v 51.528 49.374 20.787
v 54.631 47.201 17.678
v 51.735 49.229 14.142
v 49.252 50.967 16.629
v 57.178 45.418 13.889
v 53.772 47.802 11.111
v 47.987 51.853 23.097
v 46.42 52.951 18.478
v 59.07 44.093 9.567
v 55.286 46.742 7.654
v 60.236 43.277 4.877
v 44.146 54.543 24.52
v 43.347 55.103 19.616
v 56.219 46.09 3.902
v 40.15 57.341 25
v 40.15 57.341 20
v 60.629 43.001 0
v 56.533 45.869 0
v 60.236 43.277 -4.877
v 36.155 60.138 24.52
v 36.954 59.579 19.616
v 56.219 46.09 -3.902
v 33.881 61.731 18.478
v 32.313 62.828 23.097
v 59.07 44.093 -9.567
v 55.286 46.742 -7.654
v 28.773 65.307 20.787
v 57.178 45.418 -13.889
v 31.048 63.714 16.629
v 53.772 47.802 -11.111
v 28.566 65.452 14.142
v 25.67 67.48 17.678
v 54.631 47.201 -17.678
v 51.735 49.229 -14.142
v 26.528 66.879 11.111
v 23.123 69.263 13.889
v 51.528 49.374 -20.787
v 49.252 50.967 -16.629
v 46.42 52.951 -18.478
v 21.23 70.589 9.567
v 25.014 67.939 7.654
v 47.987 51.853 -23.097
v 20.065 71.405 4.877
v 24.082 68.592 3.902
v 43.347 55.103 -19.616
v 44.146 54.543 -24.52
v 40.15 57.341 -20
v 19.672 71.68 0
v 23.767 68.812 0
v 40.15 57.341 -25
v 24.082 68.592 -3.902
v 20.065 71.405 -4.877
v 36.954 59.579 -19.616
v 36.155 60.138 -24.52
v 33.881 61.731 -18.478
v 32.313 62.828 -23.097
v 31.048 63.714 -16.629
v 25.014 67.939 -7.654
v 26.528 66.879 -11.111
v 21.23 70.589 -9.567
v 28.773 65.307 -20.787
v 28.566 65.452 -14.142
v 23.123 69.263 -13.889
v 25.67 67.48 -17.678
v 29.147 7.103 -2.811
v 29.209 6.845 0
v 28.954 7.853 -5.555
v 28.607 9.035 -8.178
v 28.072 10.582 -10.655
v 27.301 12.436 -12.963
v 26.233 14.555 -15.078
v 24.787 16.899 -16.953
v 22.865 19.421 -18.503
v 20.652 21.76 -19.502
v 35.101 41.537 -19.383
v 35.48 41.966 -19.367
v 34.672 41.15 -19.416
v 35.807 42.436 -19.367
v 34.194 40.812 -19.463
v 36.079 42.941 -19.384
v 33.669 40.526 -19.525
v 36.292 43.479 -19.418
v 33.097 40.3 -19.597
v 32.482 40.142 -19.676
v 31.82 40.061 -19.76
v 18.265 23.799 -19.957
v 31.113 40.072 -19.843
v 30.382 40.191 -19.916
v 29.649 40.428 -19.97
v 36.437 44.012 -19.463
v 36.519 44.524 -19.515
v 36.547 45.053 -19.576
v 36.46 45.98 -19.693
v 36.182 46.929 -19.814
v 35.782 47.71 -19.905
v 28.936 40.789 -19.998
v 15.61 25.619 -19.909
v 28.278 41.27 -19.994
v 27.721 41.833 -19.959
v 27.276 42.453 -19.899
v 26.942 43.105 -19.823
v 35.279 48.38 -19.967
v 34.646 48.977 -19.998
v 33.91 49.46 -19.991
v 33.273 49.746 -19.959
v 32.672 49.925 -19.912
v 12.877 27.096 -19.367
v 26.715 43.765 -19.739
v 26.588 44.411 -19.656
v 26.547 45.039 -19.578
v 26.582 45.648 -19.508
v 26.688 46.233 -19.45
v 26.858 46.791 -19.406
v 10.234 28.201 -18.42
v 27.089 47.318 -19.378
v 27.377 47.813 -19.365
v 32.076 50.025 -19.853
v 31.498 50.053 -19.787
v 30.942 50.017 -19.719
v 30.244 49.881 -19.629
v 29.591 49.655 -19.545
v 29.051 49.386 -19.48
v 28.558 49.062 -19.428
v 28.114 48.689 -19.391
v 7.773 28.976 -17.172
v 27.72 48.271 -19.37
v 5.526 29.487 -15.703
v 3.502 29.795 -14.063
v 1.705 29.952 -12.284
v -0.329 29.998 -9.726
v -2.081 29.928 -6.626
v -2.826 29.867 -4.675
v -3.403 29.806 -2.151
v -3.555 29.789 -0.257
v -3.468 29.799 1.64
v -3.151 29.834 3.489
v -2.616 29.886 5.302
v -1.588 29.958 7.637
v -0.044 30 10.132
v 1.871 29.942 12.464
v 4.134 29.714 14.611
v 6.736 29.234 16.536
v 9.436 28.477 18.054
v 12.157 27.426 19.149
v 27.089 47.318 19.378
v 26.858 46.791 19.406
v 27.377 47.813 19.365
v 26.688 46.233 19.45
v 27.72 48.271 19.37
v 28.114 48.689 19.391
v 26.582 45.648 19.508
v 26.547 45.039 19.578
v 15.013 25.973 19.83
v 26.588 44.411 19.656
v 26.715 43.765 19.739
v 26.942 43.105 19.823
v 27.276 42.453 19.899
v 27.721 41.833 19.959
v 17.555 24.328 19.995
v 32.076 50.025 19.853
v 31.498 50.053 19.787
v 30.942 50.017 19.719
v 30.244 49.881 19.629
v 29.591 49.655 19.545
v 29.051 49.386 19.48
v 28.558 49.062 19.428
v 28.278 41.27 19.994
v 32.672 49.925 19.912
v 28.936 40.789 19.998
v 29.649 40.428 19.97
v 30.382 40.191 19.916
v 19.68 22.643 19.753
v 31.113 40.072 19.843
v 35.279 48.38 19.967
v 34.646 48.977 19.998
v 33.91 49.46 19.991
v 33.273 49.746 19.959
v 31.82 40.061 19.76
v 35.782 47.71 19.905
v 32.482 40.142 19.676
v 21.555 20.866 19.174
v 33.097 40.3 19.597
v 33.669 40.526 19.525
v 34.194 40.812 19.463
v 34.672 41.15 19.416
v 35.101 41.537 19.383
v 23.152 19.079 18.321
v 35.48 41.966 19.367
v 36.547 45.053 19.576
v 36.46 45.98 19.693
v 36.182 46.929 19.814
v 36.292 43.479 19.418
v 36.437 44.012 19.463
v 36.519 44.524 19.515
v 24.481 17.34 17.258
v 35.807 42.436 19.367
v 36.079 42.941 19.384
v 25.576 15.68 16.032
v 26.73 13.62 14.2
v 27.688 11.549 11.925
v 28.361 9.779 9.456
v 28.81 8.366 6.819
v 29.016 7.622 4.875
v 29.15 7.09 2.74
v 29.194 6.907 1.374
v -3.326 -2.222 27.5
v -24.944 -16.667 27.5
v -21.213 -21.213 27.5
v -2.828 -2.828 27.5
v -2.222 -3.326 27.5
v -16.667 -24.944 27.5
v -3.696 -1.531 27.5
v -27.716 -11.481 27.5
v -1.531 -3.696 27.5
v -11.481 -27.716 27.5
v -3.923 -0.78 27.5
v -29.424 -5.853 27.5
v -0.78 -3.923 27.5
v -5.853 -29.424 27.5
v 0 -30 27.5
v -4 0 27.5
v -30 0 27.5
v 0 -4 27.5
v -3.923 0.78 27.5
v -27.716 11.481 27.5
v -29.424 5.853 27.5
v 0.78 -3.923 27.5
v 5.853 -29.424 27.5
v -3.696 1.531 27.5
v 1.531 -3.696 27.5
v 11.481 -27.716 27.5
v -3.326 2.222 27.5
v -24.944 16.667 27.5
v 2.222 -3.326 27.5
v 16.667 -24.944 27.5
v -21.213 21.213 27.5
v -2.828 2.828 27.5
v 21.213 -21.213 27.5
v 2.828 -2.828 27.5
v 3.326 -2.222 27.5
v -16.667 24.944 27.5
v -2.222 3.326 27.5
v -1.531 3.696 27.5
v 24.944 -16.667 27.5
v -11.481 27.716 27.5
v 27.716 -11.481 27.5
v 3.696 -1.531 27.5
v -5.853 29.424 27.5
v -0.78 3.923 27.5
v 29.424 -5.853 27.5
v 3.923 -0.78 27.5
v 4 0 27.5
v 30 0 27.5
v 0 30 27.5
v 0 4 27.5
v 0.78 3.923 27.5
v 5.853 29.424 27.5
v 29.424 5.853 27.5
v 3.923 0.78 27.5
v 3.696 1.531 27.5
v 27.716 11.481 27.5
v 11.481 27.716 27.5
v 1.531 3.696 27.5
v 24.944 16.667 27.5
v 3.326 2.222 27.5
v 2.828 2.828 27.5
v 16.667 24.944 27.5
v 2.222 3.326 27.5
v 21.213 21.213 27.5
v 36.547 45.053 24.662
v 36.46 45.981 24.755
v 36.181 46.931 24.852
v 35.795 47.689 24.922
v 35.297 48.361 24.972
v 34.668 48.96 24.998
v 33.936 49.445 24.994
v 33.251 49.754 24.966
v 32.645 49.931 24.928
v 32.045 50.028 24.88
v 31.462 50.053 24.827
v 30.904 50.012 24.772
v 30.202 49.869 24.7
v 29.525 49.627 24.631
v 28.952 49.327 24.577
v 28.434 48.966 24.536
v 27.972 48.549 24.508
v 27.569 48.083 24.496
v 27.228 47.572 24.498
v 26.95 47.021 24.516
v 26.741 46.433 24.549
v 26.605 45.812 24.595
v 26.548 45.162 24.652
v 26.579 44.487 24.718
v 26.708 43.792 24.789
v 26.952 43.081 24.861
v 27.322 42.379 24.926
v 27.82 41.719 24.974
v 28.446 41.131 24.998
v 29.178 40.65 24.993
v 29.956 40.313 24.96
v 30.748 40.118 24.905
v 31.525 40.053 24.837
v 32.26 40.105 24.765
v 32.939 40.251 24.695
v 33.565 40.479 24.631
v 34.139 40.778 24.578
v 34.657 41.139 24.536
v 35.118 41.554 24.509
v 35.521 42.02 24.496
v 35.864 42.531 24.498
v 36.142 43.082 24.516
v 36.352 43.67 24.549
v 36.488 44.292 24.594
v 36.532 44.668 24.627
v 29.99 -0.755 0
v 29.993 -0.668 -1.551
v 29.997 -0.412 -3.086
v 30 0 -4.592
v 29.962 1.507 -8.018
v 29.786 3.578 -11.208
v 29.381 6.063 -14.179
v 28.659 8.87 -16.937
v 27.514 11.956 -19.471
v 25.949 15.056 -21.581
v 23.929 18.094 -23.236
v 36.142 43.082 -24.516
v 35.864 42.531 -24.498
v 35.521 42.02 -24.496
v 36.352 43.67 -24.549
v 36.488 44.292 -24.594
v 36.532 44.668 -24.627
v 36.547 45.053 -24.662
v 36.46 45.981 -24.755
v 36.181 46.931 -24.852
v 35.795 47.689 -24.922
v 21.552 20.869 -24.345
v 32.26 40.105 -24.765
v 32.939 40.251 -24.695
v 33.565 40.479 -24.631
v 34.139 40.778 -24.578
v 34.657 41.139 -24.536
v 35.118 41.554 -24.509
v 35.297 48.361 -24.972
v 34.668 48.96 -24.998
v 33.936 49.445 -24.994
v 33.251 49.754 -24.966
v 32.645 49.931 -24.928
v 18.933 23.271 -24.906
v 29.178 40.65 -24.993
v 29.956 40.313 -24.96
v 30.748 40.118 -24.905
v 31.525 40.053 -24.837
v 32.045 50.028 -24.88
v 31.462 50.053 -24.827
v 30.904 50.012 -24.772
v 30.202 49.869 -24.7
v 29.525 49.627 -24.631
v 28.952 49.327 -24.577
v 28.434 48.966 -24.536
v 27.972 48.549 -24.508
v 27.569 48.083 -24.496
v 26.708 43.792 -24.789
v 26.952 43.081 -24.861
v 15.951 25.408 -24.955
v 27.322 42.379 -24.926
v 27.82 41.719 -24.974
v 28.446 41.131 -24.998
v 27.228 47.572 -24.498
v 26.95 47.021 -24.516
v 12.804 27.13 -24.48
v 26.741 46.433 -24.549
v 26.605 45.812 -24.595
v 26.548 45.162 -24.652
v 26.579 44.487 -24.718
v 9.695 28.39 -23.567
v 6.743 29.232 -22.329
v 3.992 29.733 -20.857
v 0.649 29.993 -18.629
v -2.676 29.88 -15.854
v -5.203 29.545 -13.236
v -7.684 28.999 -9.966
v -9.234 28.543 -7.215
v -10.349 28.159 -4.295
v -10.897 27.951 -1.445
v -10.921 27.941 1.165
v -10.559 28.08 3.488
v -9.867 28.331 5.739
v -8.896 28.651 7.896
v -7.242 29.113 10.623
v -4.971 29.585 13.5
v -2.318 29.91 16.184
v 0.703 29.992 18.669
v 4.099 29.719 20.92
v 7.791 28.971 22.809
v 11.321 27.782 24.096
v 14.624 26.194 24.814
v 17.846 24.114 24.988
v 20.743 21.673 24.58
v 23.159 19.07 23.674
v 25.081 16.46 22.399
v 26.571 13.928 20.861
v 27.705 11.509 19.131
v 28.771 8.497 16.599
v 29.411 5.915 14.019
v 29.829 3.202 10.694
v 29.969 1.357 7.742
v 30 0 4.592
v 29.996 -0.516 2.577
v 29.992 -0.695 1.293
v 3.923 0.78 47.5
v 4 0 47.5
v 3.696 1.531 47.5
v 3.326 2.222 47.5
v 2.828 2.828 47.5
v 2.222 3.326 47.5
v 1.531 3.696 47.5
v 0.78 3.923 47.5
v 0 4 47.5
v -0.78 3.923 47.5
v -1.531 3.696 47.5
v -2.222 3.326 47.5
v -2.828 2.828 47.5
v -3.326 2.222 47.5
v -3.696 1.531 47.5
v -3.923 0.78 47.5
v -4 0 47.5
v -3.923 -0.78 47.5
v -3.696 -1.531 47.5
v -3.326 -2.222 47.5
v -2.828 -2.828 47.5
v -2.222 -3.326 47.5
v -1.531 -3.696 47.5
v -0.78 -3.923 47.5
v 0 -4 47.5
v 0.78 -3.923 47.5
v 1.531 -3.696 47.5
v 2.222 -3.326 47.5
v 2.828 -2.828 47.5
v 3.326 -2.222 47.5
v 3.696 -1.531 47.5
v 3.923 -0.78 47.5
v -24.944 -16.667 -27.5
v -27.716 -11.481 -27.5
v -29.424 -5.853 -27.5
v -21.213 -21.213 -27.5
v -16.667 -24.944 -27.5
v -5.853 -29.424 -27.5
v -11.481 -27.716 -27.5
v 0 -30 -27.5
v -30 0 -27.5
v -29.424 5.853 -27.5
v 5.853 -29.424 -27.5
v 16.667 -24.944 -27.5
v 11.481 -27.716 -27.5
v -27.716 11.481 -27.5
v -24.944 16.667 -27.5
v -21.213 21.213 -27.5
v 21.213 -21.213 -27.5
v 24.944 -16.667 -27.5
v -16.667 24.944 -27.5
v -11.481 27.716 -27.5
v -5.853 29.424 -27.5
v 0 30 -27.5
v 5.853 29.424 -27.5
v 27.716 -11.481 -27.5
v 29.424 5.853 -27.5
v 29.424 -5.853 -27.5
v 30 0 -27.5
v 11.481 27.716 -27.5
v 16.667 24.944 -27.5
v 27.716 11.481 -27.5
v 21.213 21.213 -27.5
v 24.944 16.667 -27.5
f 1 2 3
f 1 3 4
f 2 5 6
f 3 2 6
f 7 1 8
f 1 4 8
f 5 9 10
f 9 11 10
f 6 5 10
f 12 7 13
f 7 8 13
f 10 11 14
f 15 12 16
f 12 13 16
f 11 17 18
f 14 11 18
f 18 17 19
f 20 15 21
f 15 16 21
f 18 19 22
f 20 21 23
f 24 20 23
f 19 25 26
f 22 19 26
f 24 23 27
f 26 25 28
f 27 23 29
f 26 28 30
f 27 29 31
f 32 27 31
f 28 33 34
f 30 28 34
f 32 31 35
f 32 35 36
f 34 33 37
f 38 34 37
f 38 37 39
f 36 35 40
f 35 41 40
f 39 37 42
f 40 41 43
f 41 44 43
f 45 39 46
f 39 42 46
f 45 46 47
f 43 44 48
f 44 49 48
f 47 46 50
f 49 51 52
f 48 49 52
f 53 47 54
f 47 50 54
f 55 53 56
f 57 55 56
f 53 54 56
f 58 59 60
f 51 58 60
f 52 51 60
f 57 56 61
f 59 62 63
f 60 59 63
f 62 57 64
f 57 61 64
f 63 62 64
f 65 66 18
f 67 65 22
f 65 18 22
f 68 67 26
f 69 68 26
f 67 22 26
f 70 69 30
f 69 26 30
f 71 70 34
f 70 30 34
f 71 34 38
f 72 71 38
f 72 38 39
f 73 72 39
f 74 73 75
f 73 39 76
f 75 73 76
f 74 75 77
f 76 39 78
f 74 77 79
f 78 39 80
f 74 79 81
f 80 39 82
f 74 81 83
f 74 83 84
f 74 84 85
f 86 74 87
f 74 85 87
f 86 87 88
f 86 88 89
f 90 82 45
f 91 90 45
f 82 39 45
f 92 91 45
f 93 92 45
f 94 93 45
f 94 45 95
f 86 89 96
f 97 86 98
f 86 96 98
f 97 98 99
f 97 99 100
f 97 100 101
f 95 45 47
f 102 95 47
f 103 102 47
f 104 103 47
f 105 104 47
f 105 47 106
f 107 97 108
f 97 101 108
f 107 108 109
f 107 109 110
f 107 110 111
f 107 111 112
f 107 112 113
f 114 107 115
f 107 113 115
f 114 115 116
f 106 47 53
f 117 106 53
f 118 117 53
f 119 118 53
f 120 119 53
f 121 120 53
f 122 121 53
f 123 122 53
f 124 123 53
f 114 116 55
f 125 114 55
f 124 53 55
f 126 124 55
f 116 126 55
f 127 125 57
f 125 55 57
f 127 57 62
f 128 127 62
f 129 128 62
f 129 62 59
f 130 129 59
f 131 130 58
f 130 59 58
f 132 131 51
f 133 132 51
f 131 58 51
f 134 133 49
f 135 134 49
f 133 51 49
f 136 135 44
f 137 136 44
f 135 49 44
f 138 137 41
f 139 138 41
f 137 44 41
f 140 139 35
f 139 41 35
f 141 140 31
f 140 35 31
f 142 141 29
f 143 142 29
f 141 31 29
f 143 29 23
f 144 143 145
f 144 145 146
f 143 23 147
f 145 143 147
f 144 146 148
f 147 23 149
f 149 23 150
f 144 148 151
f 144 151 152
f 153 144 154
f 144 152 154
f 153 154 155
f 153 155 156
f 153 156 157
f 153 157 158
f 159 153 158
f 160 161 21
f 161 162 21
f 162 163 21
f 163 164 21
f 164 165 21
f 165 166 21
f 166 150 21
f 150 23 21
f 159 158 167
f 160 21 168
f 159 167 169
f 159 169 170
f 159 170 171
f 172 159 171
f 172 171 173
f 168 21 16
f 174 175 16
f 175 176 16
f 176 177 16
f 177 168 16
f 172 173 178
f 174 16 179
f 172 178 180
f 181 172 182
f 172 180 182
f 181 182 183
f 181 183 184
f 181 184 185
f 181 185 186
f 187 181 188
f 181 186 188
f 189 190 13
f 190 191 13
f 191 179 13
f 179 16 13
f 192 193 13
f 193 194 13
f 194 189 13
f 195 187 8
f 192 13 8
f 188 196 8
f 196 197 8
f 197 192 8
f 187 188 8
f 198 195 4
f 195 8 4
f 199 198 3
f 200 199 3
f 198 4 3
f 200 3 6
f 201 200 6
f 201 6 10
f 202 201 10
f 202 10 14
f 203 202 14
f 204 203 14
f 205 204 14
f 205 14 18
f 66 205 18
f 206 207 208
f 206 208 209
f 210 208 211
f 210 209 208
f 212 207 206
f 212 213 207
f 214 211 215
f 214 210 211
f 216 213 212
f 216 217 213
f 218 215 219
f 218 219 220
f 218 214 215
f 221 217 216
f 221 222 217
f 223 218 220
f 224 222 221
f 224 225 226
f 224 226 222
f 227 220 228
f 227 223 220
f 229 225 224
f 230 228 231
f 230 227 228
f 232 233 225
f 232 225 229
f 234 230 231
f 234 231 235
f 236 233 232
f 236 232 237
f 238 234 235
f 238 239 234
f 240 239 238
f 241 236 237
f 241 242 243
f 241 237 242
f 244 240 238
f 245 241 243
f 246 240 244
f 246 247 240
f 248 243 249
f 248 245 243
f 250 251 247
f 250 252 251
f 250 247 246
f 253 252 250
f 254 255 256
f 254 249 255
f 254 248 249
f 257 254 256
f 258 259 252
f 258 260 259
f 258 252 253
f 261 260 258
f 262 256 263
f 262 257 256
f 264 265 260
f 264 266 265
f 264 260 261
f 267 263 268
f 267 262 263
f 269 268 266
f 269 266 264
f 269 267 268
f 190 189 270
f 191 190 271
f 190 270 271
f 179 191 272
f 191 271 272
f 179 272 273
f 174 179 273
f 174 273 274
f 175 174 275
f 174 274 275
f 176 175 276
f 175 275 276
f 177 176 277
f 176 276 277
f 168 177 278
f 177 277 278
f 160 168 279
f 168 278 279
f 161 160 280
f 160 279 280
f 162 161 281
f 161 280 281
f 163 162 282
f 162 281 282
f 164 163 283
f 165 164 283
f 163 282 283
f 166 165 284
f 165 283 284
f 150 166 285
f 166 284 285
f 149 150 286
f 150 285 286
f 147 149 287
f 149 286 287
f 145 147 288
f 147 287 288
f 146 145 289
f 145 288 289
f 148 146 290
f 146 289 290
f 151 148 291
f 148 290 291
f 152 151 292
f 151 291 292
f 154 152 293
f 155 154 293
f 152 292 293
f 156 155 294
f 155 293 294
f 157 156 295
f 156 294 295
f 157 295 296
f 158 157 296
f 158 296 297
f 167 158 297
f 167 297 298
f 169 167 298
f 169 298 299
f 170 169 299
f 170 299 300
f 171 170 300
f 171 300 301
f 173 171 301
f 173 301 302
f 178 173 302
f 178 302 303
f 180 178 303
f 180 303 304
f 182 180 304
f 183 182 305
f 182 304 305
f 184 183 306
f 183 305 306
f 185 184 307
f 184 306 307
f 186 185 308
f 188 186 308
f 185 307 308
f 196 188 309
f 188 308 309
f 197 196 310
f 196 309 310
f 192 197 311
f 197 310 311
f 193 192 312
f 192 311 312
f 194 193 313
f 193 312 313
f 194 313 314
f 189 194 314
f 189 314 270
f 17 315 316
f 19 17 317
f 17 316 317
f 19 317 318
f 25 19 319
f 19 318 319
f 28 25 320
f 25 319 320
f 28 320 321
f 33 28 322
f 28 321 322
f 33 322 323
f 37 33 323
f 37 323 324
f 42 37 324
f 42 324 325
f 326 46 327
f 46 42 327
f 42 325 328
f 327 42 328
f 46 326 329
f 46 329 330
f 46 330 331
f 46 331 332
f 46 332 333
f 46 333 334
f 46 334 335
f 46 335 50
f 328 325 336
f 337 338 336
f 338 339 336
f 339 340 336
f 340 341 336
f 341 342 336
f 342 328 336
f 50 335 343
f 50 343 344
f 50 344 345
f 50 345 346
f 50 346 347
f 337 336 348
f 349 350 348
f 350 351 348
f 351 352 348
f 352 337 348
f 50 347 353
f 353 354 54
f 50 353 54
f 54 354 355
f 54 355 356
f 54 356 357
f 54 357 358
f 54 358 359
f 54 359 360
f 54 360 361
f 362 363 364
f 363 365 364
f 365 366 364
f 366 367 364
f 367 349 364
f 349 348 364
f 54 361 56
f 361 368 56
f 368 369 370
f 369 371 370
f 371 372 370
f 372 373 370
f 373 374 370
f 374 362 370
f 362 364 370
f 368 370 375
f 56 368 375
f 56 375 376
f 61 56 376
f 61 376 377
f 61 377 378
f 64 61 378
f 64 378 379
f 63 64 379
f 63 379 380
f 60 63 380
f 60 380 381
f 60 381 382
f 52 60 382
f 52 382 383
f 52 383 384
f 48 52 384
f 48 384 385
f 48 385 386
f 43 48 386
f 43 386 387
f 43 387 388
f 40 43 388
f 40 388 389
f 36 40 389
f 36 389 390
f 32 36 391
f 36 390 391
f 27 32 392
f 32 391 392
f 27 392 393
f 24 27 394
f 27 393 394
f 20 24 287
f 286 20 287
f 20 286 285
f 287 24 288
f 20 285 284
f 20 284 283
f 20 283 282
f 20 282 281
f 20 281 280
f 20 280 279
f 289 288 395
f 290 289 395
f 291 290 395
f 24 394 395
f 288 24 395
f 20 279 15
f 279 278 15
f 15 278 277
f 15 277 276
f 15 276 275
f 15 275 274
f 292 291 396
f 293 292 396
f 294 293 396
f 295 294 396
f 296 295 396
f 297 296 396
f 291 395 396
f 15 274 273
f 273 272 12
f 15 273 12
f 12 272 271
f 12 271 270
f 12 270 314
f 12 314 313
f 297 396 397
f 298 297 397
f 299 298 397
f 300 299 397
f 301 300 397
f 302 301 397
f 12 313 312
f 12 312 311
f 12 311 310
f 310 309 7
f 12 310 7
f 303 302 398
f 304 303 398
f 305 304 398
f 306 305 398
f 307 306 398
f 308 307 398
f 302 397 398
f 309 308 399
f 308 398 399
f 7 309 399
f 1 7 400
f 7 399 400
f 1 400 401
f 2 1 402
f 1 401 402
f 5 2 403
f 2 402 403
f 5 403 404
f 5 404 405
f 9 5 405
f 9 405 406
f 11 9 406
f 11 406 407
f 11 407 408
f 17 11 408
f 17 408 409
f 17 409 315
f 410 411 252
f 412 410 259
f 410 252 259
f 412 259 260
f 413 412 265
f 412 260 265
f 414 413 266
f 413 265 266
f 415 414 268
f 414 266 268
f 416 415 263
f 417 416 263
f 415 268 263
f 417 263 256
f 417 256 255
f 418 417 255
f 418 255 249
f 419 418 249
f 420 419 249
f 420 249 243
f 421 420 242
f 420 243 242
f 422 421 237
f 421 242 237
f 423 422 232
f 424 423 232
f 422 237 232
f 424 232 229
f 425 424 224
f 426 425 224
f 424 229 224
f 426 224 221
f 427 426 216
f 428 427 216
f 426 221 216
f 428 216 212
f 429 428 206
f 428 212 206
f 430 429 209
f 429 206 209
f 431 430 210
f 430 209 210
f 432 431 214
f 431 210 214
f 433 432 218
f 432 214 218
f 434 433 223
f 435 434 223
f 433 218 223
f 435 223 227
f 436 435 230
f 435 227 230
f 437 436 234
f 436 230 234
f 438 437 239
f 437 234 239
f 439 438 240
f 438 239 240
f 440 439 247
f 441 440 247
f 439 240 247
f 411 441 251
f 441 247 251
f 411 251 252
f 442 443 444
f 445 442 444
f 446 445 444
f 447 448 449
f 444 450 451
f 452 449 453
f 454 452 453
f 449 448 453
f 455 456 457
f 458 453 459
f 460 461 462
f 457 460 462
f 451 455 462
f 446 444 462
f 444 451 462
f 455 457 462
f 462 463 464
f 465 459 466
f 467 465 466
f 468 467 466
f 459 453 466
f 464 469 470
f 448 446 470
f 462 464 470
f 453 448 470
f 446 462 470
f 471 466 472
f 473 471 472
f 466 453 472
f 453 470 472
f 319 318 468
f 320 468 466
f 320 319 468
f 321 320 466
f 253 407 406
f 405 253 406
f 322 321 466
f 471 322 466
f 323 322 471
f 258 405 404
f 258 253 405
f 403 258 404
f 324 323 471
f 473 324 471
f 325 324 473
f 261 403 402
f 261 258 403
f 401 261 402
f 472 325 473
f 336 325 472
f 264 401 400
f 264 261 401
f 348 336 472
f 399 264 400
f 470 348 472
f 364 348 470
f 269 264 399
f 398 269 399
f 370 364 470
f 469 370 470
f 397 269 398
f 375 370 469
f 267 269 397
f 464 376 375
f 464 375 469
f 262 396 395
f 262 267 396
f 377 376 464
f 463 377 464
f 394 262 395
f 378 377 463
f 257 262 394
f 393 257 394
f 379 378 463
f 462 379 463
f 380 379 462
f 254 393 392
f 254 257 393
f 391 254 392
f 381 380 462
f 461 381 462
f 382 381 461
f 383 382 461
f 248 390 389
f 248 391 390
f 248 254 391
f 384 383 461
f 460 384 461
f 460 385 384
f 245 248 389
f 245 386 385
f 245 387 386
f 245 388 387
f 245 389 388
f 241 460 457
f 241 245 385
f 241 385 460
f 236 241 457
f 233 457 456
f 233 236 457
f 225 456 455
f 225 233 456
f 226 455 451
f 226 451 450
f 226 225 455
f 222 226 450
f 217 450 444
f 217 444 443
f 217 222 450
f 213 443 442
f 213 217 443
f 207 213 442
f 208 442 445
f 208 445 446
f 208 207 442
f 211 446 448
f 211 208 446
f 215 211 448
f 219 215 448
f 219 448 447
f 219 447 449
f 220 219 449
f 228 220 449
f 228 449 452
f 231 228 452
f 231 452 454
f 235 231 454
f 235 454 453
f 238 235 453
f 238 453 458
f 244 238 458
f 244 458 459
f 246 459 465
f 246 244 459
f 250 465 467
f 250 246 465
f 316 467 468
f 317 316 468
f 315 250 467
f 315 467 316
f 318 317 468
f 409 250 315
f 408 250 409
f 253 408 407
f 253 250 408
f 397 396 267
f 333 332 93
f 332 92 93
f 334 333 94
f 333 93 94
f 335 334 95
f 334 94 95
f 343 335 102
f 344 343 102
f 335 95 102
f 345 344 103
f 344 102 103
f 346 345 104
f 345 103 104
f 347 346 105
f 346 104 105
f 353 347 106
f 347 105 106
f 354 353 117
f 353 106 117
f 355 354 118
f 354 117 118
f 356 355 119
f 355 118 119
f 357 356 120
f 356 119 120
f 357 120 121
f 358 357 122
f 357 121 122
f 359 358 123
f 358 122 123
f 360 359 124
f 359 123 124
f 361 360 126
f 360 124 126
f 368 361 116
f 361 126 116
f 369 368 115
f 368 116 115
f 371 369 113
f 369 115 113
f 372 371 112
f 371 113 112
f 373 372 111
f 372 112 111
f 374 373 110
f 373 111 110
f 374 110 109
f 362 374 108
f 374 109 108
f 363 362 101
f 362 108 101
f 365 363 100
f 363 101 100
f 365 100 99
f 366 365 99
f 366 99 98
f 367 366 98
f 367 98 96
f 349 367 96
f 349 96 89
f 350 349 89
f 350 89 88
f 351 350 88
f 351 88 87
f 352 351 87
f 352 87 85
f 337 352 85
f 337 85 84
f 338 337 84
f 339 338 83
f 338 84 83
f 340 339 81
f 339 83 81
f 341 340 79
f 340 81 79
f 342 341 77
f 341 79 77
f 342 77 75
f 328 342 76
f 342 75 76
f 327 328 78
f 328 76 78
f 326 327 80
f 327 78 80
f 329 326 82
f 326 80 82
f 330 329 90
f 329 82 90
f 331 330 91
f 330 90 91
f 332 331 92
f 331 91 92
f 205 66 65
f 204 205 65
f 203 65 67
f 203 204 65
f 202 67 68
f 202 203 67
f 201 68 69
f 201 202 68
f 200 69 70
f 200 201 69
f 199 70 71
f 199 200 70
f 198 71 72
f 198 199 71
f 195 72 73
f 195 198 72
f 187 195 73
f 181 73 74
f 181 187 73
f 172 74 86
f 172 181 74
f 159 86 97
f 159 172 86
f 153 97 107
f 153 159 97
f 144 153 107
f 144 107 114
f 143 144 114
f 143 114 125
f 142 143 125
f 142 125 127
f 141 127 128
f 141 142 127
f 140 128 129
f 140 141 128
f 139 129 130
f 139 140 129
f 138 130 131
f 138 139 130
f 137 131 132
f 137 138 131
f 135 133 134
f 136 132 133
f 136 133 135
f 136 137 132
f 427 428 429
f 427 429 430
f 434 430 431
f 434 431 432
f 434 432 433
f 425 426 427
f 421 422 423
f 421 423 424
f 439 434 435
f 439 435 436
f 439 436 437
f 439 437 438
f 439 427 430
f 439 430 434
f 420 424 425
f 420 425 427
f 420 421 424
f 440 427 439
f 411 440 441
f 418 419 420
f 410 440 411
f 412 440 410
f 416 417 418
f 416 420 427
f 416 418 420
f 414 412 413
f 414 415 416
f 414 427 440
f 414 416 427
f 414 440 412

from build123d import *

# Parameters (mm, degrees)
SKETCH1_R           = 30
BOSS_EXTRUDE1_DEPTH = 27.5
SKETCH3_R           = 5
CUT_EXTRUDE1_DEPTH  = 30
SKETCH5_R           = 4
BOSS_EXTRUDE2_DEPTH = 20


with BuildPart() as part:
    # Sketch1 → Boss-Extrude1 (new, symmetric)
    with BuildSketch(Plane.XY):
        Circle(SKETCH1_R)
    extrude(amount=BOSS_EXTRUDE1_DEPTH, both=True)

    # Sketch2 → Revolve2 (revolve)
    with BuildSketch(Plane.XY):
        Polygon((56.53339143, 45.869114373), (60.629151652, 43.001232191), (28.508871216, -2.871282289), (24.413110995, -0.003400107), align=None)
    revolve(axis=Axis((0, 0, 0), (0.5735764363510413, 0.8191520442889952, 0)))

    # Sketch3 → Cut-Extrude1 (cut, symmetric)
    with BuildSketch(Plane.XY):
        with Locations((31.546703999, 45.053362436)):
            Circle(SKETCH3_R)
    extrude(amount=CUT_EXTRUDE1_DEPTH, both=True, mode=Mode.SUBTRACT)

    # Sketch5 → Boss-Extrude2 (add)
    with BuildSketch(Plane.XY.offset(27.5)):
        Circle(SKETCH5_R)
    extrude(amount=BOSS_EXTRUDE2_DEPTH)


solid = part.part
